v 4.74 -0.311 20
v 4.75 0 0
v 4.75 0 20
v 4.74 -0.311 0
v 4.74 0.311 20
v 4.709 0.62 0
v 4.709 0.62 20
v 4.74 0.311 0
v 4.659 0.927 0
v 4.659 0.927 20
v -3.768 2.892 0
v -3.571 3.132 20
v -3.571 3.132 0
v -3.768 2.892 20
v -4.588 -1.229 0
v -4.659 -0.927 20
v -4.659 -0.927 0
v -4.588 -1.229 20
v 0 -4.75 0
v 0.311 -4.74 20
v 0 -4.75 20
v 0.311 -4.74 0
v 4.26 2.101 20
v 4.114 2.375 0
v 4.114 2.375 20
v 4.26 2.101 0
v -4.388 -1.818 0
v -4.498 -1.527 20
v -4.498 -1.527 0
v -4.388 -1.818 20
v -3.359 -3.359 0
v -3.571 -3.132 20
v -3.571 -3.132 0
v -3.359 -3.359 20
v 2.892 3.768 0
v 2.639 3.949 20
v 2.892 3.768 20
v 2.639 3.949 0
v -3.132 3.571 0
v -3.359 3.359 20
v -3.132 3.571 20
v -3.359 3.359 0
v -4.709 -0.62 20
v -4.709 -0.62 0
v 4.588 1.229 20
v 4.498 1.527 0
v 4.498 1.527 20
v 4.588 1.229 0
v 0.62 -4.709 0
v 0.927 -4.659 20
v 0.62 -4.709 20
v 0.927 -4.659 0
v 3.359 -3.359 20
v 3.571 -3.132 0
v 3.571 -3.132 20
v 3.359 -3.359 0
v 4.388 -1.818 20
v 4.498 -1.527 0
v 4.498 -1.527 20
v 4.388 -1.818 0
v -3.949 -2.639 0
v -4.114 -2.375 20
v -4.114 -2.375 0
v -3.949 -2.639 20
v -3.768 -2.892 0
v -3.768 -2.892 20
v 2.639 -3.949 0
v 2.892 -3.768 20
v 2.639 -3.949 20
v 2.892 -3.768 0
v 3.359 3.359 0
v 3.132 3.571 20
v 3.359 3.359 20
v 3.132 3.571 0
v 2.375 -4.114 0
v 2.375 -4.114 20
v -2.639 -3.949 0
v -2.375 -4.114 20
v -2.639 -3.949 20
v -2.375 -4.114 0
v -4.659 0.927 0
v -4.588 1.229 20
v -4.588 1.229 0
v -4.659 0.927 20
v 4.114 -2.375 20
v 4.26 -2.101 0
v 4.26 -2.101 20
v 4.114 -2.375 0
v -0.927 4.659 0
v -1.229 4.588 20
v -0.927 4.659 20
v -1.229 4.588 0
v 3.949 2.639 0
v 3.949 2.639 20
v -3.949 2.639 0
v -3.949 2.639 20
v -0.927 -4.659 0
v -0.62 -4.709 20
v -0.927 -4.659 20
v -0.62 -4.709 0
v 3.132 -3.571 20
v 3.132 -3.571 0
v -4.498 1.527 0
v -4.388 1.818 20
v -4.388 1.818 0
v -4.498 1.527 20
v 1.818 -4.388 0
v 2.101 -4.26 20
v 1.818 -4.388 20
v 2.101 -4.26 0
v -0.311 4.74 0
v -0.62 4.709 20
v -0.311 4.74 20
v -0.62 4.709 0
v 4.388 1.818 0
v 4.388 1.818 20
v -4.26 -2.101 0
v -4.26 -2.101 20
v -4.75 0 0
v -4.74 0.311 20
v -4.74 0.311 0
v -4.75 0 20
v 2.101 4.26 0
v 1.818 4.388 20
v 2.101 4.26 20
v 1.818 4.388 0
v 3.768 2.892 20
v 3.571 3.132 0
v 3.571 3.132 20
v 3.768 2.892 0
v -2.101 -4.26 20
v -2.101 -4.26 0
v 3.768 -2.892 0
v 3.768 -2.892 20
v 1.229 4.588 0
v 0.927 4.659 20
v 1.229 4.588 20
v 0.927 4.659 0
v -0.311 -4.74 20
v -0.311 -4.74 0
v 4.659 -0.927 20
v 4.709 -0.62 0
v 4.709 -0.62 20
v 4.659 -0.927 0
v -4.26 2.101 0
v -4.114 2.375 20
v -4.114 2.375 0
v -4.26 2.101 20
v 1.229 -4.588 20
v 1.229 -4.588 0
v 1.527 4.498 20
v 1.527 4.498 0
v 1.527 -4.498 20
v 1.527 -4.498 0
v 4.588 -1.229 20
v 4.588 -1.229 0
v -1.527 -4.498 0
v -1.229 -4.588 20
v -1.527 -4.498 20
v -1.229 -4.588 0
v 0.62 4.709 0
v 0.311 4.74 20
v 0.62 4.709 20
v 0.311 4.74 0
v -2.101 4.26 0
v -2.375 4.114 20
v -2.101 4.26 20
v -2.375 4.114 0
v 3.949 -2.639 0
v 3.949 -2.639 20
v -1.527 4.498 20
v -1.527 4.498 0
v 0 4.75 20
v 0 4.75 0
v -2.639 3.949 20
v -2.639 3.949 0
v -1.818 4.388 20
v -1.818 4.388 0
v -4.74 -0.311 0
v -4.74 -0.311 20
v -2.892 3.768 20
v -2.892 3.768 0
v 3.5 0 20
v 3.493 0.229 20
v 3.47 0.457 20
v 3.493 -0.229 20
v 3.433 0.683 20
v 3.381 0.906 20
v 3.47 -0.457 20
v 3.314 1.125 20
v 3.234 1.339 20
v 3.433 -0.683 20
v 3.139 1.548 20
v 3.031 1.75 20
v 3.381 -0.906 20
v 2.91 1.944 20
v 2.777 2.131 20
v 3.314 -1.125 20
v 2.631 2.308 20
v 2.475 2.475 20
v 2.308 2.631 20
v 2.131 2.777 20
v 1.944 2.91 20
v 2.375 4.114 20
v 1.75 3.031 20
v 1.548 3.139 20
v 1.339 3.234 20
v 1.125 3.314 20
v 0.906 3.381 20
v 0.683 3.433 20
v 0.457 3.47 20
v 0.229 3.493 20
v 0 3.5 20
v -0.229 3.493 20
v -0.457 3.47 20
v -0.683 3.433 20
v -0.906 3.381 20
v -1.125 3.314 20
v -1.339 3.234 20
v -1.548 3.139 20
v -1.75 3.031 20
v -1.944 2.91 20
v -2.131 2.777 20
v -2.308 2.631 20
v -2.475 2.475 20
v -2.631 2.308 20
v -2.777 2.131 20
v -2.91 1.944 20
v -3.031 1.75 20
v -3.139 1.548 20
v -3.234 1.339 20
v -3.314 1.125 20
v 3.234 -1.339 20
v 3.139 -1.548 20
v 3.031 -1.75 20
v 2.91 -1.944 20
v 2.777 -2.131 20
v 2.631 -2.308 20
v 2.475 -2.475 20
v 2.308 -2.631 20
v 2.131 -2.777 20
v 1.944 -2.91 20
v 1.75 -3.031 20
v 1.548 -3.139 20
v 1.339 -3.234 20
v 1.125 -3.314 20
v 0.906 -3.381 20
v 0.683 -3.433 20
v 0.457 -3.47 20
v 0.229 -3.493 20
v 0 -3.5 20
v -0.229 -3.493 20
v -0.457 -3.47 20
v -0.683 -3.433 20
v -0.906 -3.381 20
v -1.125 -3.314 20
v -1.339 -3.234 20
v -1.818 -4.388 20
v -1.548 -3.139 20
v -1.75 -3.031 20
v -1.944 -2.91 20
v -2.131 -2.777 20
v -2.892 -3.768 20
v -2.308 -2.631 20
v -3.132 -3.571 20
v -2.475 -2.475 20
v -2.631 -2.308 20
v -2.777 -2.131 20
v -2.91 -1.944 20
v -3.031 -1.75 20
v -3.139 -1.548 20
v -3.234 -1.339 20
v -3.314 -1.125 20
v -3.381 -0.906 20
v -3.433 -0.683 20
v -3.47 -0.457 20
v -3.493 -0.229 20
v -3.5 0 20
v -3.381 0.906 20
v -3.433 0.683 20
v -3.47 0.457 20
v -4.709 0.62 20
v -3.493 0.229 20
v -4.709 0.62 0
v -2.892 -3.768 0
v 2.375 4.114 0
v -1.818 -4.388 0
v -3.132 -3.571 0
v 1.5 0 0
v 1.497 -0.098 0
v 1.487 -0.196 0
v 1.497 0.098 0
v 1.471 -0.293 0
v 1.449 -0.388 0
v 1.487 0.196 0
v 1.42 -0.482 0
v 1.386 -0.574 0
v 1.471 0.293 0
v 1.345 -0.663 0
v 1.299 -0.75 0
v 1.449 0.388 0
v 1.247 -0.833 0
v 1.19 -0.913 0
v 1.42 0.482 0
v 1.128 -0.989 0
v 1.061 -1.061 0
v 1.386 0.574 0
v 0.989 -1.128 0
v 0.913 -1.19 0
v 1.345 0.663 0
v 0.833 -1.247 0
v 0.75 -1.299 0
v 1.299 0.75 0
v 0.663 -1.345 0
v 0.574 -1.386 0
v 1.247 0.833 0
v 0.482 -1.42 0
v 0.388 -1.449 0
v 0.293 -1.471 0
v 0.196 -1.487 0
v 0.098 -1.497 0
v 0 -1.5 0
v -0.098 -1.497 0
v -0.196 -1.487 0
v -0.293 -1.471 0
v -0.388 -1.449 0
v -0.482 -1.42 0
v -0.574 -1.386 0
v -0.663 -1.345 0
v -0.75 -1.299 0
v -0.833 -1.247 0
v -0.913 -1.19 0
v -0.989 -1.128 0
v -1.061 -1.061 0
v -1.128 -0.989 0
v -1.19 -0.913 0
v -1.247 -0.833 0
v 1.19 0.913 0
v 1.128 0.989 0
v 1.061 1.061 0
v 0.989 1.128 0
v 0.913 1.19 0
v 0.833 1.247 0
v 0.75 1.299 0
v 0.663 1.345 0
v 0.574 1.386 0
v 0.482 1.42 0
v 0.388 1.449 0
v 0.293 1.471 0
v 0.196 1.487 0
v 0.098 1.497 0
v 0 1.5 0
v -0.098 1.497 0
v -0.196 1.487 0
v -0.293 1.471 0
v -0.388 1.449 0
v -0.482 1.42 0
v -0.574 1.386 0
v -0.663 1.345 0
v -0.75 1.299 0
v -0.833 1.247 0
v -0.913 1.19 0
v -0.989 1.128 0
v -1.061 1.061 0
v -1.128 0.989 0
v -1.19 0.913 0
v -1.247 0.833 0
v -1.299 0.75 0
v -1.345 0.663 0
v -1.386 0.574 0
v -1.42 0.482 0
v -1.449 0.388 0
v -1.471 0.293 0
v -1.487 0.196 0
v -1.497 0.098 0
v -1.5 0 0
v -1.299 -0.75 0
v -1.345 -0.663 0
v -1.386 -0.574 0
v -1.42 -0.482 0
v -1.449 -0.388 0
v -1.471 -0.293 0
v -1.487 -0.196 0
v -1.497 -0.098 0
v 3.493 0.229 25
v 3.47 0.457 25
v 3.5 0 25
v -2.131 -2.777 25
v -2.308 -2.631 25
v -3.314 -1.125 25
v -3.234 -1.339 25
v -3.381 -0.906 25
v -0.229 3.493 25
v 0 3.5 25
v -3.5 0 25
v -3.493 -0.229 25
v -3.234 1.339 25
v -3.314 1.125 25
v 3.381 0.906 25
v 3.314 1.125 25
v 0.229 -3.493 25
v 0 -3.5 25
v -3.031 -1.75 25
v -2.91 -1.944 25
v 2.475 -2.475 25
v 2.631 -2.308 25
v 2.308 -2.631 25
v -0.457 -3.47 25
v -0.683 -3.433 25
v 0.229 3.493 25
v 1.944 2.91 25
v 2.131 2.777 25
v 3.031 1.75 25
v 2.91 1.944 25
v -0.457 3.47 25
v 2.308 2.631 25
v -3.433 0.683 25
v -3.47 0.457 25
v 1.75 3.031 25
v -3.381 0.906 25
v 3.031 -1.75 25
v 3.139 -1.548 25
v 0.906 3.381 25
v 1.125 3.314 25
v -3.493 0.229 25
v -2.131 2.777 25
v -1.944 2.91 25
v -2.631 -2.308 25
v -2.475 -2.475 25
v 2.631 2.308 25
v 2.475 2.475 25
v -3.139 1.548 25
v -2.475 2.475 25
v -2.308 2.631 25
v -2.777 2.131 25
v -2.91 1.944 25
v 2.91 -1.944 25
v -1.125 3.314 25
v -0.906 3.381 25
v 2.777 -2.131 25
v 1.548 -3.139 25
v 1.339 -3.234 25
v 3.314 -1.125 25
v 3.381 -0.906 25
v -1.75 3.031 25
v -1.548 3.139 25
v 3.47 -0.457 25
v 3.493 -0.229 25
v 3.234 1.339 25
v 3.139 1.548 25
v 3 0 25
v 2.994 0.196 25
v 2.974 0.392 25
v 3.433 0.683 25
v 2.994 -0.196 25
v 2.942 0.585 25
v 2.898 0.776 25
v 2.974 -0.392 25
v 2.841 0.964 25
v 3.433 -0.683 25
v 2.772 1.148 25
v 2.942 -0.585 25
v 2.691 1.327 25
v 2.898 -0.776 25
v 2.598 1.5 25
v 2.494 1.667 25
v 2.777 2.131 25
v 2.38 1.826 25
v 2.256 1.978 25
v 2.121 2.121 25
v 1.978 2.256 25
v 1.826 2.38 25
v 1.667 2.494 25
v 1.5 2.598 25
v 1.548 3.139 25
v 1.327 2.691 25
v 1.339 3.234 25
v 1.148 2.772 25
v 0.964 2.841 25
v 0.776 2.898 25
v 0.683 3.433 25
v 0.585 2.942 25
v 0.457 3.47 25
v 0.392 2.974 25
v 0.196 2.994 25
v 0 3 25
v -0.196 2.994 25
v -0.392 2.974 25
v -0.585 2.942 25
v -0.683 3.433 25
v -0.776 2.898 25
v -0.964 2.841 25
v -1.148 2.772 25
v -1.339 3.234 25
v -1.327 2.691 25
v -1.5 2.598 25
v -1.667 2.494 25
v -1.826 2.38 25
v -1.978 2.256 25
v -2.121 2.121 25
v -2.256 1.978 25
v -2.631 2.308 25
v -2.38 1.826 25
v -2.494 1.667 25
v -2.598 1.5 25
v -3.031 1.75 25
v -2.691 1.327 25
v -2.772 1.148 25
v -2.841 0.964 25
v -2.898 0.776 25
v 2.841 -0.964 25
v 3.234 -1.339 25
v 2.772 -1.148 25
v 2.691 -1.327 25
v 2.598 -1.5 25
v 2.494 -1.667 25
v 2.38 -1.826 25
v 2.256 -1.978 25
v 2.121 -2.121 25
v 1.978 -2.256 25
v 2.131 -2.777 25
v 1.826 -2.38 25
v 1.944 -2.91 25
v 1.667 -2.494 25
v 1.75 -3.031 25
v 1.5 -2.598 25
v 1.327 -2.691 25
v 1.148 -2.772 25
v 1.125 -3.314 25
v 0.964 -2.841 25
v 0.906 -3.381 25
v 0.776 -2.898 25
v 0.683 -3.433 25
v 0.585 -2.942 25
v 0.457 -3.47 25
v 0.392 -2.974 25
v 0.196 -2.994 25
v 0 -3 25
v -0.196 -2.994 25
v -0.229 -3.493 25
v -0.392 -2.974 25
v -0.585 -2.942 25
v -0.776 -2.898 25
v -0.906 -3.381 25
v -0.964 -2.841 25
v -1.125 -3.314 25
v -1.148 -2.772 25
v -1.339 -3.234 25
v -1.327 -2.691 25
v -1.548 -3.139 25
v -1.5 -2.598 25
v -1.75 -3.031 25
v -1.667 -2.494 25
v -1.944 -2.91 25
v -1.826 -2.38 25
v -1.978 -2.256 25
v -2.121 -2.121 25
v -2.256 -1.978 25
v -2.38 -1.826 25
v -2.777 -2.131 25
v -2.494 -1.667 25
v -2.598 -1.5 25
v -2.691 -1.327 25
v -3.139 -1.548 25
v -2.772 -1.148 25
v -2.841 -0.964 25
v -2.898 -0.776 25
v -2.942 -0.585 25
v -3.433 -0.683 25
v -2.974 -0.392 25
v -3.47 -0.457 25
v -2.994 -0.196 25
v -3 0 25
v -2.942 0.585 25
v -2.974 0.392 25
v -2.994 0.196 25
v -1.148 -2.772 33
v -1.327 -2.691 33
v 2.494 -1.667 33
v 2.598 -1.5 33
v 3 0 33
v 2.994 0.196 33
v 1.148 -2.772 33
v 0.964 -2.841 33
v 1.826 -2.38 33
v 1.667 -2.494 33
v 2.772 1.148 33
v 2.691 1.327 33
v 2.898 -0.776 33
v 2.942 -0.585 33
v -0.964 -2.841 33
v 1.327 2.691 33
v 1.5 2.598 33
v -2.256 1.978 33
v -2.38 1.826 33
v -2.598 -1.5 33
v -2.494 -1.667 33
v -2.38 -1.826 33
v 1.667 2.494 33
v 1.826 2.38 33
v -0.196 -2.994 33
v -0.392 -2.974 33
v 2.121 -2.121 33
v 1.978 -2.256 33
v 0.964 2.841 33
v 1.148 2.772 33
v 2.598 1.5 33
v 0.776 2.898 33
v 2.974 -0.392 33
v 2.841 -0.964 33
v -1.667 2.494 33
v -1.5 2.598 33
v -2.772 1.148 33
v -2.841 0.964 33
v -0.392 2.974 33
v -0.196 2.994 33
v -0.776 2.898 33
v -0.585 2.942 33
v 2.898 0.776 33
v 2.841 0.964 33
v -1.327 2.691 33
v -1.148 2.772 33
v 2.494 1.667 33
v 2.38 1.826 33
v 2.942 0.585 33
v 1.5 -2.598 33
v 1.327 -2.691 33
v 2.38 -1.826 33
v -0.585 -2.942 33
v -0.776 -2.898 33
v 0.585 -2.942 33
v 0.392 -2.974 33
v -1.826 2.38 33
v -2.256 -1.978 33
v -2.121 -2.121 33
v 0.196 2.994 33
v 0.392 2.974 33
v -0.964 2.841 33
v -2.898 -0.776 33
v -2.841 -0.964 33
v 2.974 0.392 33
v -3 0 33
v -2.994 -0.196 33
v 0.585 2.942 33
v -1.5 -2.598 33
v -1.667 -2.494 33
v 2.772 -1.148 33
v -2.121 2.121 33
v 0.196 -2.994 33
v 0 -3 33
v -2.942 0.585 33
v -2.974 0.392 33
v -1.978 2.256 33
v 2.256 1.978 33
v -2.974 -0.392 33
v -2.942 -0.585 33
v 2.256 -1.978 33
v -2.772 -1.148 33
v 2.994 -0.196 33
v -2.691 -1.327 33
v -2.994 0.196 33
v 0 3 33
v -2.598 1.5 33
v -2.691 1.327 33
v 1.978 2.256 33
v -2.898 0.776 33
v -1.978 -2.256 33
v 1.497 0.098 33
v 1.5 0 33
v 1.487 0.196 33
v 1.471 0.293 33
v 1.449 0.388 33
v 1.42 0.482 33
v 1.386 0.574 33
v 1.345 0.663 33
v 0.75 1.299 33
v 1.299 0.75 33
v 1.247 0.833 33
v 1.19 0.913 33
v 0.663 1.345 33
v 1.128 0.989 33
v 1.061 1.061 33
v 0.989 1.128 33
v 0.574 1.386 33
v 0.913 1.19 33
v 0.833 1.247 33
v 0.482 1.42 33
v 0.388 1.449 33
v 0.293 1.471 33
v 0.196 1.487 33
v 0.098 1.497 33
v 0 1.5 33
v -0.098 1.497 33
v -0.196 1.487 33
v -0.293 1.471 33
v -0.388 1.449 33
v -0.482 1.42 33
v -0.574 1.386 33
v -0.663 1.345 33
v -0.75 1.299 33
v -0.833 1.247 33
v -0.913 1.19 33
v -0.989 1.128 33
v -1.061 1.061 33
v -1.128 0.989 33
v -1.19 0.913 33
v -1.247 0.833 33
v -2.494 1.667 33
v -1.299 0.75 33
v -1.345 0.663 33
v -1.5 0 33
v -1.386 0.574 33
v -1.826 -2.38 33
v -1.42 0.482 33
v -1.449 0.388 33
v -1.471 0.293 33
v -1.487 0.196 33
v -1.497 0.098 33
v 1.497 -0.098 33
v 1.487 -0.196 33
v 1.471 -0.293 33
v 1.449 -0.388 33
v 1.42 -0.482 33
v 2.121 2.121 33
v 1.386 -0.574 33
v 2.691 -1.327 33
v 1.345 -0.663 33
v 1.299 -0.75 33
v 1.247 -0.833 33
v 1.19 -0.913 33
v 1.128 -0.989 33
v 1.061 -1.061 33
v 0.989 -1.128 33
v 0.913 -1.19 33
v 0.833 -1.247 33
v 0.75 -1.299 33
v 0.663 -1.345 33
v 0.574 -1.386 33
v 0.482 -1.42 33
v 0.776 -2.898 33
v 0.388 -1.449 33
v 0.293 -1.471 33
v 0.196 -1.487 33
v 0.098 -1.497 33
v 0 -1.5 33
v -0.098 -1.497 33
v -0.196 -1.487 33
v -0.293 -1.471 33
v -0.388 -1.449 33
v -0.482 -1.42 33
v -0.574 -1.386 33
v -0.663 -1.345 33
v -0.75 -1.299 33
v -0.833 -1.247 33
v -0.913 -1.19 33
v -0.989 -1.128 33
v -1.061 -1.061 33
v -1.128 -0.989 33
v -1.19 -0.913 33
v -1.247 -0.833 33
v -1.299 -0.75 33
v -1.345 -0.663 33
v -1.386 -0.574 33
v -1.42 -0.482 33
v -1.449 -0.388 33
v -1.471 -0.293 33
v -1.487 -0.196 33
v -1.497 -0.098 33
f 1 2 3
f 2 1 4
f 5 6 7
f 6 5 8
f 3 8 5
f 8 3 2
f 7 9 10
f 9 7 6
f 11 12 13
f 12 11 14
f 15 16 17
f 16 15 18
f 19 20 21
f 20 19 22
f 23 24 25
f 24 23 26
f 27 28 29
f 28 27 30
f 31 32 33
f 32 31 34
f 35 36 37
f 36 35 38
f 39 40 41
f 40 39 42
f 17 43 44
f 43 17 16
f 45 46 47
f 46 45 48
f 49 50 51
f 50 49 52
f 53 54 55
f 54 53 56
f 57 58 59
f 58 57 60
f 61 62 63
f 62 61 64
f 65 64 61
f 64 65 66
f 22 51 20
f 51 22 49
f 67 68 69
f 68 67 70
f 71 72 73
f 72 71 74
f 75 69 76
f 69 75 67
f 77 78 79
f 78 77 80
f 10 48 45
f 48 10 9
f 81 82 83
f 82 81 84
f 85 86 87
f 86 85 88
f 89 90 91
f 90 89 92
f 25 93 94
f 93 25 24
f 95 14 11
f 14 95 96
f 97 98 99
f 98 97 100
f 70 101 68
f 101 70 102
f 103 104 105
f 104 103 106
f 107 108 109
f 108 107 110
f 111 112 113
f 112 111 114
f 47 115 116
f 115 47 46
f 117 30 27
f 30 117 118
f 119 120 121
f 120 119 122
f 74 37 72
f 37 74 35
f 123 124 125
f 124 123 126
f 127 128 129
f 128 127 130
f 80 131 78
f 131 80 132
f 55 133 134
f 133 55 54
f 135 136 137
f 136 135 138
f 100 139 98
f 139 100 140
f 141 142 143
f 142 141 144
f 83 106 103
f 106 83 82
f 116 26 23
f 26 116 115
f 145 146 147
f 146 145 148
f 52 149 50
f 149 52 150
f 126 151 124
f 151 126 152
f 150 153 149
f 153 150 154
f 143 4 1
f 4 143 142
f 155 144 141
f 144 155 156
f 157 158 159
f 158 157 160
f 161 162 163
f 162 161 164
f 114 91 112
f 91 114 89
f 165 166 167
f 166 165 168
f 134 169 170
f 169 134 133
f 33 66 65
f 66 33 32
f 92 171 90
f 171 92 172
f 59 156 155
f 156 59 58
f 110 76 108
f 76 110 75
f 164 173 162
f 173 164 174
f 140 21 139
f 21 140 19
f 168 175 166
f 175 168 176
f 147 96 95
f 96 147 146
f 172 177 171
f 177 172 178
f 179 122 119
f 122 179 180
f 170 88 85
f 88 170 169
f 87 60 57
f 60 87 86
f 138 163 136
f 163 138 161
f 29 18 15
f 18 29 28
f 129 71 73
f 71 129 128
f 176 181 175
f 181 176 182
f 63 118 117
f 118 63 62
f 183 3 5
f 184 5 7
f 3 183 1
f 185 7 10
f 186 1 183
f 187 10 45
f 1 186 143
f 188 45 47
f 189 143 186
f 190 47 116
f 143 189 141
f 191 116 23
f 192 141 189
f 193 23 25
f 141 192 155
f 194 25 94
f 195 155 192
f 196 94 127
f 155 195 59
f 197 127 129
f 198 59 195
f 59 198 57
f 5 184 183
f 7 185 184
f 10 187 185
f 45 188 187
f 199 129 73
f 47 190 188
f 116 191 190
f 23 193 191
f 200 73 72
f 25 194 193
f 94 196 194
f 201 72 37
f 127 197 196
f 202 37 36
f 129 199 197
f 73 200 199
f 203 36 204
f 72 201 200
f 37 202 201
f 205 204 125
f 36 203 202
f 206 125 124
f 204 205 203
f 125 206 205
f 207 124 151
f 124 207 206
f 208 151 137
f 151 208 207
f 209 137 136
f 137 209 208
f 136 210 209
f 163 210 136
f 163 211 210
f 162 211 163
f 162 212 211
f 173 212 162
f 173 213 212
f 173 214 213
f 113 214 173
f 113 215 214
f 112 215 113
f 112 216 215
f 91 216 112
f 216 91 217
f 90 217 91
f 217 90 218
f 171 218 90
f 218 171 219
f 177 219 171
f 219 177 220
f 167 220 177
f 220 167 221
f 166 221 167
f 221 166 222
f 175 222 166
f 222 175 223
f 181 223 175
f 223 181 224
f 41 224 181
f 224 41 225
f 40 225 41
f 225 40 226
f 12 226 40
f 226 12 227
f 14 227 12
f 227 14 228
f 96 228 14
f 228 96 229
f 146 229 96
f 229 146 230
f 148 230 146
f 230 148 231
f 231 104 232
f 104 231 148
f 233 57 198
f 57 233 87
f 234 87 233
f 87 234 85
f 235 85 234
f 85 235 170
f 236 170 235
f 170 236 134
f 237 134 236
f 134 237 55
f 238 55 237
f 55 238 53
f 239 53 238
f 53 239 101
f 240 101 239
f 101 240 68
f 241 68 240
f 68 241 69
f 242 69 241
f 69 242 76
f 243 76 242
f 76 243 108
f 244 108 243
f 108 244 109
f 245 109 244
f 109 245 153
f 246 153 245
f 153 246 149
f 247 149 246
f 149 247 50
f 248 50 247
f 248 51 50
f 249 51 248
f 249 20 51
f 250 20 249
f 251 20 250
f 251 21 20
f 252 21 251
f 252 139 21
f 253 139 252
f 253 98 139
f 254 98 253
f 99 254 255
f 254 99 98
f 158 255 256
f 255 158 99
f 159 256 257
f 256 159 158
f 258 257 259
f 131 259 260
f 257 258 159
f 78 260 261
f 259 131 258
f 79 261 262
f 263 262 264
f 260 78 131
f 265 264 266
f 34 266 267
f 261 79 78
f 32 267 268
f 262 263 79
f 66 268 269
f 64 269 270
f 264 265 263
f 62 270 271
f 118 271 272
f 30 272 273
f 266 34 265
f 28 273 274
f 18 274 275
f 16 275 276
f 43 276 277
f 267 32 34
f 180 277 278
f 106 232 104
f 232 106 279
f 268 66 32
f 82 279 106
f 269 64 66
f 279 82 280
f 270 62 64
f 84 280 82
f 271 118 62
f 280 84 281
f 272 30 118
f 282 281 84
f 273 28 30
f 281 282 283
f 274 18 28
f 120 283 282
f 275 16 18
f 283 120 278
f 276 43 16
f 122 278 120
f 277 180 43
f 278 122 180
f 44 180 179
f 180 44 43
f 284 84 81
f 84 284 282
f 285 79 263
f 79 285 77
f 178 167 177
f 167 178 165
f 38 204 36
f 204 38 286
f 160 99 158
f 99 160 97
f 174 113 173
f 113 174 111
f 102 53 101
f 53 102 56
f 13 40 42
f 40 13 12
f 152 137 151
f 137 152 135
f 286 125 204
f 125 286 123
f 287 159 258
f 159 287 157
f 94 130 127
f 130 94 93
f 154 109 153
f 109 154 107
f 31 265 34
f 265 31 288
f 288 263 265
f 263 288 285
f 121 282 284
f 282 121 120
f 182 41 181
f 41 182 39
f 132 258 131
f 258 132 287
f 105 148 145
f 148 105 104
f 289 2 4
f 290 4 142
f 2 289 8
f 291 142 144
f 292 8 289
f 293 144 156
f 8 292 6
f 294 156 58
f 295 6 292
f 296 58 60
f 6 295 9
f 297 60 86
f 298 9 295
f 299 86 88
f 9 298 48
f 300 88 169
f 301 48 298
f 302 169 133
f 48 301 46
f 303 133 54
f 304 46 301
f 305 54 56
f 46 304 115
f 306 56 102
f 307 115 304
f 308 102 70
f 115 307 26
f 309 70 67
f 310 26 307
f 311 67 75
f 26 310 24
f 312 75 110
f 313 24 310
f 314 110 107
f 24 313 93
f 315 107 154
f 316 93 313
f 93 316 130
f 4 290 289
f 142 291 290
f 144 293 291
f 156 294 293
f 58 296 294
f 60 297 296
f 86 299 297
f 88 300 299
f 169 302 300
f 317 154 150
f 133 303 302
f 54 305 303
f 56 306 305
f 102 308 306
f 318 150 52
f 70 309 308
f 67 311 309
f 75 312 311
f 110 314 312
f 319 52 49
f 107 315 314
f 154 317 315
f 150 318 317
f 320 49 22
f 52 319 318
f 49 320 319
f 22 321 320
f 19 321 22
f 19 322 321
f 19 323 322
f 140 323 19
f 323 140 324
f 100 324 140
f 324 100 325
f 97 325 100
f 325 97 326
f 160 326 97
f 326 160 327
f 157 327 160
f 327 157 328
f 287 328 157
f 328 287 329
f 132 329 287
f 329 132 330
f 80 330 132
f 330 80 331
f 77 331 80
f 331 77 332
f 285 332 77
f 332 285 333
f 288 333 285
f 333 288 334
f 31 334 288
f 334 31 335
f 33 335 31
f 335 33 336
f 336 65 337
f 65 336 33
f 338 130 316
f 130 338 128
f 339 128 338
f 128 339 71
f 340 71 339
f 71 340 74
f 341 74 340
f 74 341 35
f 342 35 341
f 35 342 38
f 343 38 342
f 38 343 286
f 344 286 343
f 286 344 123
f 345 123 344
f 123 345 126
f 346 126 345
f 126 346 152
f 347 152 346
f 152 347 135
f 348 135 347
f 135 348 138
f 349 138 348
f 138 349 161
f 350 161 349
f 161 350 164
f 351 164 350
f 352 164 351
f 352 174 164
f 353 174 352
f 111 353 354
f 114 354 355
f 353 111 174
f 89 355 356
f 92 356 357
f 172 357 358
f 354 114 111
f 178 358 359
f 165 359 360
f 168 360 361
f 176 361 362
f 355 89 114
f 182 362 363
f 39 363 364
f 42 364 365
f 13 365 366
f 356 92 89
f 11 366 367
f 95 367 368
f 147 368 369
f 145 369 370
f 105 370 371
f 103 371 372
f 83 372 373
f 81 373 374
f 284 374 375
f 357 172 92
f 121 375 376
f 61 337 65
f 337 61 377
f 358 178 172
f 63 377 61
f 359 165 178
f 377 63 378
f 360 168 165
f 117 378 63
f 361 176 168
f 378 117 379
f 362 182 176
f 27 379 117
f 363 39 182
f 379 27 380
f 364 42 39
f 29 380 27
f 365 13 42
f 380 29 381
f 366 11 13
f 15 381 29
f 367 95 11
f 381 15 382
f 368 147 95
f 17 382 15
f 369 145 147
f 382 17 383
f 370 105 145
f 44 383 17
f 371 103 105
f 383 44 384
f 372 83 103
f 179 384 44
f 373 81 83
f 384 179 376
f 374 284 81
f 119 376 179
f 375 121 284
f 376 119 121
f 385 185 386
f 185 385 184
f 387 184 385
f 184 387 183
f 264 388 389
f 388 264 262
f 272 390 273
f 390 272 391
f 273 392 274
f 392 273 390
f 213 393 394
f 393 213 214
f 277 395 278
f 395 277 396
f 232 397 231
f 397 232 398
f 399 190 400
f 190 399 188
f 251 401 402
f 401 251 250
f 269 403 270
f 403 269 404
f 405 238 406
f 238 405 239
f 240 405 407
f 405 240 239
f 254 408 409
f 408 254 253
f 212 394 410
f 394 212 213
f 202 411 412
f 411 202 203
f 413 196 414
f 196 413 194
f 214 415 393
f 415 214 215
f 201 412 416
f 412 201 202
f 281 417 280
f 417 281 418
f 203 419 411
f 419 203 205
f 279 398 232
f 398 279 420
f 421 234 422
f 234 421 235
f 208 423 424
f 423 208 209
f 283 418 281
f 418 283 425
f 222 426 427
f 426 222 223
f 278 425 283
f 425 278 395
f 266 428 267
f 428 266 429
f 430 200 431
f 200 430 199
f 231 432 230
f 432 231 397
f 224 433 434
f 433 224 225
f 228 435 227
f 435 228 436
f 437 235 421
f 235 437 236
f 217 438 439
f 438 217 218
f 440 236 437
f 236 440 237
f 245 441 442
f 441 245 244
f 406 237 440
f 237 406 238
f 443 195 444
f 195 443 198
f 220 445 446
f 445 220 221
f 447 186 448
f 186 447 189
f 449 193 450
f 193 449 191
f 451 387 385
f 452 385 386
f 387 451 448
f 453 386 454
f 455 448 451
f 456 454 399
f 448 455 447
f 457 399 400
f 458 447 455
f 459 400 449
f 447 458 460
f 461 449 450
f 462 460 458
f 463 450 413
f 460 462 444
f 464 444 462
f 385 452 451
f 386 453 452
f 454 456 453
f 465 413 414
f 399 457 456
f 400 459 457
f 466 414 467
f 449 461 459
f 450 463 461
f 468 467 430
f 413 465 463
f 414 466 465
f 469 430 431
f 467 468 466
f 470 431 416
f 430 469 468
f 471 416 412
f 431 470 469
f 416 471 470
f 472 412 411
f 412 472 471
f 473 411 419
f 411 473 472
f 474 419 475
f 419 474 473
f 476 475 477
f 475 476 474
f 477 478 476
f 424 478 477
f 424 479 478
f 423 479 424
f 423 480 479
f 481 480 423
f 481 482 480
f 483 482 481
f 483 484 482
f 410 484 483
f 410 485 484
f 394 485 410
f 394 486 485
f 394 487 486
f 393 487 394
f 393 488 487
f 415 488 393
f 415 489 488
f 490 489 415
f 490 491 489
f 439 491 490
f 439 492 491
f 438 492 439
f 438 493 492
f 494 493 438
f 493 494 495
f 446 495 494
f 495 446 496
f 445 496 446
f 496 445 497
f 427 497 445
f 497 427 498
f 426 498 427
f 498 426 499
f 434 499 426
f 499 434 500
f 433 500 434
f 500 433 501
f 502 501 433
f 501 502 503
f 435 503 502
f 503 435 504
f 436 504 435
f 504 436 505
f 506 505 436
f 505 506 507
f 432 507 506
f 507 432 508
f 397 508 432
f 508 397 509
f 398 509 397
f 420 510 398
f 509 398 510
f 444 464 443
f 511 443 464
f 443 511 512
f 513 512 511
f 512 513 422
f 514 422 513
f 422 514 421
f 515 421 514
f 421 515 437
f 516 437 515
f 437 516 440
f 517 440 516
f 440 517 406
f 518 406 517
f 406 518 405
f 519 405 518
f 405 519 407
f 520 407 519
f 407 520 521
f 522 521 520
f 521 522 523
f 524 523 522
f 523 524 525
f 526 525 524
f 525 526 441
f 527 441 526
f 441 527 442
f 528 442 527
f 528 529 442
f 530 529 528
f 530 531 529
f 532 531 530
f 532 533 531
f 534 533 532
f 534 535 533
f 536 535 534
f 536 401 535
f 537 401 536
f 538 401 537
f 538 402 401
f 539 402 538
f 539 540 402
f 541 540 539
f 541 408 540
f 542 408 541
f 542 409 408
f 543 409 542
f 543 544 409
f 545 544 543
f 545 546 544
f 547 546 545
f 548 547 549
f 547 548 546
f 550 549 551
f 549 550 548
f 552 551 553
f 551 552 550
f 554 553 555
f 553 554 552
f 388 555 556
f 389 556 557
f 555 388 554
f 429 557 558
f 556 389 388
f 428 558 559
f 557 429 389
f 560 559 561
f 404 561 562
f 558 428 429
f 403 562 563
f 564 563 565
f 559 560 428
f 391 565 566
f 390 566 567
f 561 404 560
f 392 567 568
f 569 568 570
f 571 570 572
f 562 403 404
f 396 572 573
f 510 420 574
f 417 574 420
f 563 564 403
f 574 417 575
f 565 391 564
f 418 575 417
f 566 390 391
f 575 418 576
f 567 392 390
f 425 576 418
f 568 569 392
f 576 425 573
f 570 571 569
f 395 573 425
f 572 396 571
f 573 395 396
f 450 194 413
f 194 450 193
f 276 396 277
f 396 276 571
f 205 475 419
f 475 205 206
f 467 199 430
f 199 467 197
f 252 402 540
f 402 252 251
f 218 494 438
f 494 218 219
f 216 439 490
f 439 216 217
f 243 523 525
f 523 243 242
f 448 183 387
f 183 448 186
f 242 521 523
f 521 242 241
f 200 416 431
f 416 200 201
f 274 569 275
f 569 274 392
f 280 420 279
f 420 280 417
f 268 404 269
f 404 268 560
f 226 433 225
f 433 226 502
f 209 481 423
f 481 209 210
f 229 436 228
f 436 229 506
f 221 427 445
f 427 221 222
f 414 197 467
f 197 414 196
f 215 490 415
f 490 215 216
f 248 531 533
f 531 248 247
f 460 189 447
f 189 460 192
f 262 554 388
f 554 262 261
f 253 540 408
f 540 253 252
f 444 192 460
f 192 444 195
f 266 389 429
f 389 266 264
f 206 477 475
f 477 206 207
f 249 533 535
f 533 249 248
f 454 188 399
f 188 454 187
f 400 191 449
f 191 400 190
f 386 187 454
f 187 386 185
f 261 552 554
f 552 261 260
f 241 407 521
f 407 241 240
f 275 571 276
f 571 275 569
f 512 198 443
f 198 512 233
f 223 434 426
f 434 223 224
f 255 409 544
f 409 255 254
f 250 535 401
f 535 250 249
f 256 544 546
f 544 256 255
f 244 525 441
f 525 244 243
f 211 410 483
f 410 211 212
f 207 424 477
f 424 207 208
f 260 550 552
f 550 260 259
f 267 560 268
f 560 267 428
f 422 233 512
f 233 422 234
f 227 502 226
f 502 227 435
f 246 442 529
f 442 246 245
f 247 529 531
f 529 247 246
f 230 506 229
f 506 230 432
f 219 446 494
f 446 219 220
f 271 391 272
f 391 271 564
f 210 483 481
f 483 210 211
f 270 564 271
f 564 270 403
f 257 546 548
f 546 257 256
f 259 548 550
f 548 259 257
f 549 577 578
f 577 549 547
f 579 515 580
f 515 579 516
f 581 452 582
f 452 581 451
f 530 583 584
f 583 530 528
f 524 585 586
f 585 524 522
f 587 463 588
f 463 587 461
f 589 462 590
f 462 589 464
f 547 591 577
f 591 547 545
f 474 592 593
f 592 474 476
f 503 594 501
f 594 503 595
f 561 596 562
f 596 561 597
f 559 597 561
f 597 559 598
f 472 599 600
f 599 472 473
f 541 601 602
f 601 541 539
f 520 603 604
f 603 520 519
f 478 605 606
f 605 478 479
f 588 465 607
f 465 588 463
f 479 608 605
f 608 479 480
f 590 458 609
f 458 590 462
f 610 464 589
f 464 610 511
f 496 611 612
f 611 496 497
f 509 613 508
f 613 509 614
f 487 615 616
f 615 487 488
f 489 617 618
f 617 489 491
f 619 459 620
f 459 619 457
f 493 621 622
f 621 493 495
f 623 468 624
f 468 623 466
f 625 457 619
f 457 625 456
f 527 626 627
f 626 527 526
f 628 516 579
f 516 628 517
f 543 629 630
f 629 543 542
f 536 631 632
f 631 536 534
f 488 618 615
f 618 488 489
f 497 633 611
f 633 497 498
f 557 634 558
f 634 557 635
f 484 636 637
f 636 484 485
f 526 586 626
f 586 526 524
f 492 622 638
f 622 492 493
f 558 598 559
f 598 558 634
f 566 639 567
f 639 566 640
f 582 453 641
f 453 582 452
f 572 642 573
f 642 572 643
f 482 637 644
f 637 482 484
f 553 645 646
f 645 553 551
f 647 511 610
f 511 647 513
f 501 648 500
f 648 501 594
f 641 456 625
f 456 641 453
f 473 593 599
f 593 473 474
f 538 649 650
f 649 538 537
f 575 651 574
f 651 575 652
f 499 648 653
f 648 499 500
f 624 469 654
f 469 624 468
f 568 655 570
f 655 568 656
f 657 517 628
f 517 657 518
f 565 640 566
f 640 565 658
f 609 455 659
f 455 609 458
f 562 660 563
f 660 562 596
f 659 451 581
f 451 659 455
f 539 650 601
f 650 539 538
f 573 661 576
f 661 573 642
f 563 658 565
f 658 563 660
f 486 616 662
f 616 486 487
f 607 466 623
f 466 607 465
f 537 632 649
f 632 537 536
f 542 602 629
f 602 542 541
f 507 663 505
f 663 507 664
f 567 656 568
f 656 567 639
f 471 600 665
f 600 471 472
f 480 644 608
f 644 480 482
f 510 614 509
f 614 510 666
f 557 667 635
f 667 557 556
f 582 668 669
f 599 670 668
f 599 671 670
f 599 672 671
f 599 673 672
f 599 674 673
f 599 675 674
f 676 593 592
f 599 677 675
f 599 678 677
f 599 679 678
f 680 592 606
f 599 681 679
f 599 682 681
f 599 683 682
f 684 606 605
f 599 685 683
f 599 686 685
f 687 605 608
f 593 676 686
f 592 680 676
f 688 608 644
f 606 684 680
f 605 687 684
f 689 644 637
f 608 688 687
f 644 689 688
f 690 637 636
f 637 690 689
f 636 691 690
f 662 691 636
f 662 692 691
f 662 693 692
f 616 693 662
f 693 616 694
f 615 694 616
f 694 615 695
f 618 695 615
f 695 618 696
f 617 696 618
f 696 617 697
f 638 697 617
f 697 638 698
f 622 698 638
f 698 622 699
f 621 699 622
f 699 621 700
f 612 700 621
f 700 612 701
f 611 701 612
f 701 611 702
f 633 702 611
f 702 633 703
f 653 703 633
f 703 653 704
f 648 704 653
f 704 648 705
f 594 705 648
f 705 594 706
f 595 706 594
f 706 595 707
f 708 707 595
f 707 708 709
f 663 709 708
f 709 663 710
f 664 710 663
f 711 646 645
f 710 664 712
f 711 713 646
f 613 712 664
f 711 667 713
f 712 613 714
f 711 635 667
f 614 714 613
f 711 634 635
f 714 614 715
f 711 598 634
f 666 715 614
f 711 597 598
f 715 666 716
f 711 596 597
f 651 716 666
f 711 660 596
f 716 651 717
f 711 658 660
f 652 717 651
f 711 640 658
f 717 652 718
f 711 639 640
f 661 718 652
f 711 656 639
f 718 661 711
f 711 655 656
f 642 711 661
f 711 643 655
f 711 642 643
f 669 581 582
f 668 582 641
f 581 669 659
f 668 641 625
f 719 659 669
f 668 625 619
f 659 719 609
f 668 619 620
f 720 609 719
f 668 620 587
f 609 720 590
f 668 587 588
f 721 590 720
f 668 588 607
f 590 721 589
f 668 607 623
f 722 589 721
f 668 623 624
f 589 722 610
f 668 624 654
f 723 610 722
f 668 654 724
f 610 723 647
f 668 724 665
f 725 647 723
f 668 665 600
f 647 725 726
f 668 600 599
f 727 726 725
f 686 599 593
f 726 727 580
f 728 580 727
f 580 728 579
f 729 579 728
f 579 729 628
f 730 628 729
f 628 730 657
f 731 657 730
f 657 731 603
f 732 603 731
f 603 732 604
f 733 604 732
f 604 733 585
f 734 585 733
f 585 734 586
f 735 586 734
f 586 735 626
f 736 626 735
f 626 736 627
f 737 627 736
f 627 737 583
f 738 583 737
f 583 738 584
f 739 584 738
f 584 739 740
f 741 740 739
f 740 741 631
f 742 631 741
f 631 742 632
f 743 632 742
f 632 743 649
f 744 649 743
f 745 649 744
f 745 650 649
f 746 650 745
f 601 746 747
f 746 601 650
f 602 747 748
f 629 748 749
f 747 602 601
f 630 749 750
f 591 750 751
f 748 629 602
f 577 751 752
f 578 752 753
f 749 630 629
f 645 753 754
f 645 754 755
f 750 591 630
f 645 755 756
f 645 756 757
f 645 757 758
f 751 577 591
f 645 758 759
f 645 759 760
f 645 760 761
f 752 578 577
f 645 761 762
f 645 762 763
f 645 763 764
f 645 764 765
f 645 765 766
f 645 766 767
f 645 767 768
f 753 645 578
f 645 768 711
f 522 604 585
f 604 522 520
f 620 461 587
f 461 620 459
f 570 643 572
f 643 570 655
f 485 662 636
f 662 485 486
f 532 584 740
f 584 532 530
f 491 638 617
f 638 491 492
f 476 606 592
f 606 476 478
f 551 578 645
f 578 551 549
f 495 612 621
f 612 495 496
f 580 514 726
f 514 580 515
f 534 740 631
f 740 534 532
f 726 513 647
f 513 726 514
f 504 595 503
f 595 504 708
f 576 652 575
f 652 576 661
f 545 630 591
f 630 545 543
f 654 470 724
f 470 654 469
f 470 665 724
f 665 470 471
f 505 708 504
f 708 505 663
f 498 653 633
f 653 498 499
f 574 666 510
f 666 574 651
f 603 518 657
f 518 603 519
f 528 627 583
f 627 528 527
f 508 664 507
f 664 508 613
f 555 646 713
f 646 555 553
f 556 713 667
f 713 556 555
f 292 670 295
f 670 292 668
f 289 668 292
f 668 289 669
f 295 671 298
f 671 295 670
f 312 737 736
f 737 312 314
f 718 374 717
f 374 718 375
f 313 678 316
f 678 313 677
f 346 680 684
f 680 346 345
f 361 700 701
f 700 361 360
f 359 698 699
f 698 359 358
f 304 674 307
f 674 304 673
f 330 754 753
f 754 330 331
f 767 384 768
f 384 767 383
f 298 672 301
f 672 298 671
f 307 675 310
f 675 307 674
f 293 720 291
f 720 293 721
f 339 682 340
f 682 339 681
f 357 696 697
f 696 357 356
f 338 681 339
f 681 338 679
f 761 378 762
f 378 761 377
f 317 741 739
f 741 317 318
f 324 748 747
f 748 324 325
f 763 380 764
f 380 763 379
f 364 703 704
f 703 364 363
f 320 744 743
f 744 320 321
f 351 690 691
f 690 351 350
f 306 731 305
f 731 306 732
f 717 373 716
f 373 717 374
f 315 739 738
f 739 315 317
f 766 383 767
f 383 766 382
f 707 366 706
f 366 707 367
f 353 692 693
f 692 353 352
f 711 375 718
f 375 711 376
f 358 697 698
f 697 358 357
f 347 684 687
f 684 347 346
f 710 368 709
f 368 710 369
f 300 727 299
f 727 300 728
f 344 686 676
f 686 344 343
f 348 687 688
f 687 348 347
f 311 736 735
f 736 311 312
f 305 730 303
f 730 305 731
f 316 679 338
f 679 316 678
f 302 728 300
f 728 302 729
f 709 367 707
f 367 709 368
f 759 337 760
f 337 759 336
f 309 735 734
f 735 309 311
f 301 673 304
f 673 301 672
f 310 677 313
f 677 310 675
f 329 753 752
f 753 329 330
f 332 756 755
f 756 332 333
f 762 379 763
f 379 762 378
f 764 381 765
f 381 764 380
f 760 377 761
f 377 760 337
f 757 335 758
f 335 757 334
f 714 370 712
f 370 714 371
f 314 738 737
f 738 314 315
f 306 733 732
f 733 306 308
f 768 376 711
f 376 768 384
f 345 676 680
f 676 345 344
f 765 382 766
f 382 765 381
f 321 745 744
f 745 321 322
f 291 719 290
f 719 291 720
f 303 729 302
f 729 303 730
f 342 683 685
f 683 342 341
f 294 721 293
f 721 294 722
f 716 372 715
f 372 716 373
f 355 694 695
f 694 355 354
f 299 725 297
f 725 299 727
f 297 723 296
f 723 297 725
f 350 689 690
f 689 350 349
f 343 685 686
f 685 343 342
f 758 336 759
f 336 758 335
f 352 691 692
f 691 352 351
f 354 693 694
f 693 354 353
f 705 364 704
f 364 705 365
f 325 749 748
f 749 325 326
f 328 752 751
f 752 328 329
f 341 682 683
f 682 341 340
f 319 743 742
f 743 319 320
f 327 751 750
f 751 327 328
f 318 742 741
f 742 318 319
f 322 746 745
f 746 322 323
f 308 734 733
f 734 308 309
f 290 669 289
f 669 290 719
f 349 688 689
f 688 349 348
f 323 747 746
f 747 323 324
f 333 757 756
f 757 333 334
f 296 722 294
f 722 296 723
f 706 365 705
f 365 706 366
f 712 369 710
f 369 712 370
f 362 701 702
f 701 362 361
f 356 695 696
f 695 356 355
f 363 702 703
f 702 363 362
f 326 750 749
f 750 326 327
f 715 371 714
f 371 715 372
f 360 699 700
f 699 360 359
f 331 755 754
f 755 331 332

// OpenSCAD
// Hose-barb reducer: 8 mm ID tubing to 5 mm ID tubing
// Print orientation: standing upright along Z

// ---------- Parameters ----------
id_large   = 8;    // larger tubing inner diameter
id_small   = 5;    // smaller tubing inner diameter
bore       = 3;    // through-bore diameter
eps        = 0.5;  // cutter overshoot

$fn = 96;

// ---------- Model ----------
difference() {
    union() {
        // Lower barb section (8 mm tubing)
        cylinder(h = 20, d = id_large + 1.5);

        // Upper collar section
        translate([0, 0, 20])
            cylinder(h = 5, d = id_small + 2);

        // Upper barb section (5 mm tubing)
        translate([0, 0, 25])
            cylinder(h = 8, d = id_small + 1);
    }

    // Through-bore
    translate([0, 0, -eps])
        cylinder(h = 43, d = bore);
}
